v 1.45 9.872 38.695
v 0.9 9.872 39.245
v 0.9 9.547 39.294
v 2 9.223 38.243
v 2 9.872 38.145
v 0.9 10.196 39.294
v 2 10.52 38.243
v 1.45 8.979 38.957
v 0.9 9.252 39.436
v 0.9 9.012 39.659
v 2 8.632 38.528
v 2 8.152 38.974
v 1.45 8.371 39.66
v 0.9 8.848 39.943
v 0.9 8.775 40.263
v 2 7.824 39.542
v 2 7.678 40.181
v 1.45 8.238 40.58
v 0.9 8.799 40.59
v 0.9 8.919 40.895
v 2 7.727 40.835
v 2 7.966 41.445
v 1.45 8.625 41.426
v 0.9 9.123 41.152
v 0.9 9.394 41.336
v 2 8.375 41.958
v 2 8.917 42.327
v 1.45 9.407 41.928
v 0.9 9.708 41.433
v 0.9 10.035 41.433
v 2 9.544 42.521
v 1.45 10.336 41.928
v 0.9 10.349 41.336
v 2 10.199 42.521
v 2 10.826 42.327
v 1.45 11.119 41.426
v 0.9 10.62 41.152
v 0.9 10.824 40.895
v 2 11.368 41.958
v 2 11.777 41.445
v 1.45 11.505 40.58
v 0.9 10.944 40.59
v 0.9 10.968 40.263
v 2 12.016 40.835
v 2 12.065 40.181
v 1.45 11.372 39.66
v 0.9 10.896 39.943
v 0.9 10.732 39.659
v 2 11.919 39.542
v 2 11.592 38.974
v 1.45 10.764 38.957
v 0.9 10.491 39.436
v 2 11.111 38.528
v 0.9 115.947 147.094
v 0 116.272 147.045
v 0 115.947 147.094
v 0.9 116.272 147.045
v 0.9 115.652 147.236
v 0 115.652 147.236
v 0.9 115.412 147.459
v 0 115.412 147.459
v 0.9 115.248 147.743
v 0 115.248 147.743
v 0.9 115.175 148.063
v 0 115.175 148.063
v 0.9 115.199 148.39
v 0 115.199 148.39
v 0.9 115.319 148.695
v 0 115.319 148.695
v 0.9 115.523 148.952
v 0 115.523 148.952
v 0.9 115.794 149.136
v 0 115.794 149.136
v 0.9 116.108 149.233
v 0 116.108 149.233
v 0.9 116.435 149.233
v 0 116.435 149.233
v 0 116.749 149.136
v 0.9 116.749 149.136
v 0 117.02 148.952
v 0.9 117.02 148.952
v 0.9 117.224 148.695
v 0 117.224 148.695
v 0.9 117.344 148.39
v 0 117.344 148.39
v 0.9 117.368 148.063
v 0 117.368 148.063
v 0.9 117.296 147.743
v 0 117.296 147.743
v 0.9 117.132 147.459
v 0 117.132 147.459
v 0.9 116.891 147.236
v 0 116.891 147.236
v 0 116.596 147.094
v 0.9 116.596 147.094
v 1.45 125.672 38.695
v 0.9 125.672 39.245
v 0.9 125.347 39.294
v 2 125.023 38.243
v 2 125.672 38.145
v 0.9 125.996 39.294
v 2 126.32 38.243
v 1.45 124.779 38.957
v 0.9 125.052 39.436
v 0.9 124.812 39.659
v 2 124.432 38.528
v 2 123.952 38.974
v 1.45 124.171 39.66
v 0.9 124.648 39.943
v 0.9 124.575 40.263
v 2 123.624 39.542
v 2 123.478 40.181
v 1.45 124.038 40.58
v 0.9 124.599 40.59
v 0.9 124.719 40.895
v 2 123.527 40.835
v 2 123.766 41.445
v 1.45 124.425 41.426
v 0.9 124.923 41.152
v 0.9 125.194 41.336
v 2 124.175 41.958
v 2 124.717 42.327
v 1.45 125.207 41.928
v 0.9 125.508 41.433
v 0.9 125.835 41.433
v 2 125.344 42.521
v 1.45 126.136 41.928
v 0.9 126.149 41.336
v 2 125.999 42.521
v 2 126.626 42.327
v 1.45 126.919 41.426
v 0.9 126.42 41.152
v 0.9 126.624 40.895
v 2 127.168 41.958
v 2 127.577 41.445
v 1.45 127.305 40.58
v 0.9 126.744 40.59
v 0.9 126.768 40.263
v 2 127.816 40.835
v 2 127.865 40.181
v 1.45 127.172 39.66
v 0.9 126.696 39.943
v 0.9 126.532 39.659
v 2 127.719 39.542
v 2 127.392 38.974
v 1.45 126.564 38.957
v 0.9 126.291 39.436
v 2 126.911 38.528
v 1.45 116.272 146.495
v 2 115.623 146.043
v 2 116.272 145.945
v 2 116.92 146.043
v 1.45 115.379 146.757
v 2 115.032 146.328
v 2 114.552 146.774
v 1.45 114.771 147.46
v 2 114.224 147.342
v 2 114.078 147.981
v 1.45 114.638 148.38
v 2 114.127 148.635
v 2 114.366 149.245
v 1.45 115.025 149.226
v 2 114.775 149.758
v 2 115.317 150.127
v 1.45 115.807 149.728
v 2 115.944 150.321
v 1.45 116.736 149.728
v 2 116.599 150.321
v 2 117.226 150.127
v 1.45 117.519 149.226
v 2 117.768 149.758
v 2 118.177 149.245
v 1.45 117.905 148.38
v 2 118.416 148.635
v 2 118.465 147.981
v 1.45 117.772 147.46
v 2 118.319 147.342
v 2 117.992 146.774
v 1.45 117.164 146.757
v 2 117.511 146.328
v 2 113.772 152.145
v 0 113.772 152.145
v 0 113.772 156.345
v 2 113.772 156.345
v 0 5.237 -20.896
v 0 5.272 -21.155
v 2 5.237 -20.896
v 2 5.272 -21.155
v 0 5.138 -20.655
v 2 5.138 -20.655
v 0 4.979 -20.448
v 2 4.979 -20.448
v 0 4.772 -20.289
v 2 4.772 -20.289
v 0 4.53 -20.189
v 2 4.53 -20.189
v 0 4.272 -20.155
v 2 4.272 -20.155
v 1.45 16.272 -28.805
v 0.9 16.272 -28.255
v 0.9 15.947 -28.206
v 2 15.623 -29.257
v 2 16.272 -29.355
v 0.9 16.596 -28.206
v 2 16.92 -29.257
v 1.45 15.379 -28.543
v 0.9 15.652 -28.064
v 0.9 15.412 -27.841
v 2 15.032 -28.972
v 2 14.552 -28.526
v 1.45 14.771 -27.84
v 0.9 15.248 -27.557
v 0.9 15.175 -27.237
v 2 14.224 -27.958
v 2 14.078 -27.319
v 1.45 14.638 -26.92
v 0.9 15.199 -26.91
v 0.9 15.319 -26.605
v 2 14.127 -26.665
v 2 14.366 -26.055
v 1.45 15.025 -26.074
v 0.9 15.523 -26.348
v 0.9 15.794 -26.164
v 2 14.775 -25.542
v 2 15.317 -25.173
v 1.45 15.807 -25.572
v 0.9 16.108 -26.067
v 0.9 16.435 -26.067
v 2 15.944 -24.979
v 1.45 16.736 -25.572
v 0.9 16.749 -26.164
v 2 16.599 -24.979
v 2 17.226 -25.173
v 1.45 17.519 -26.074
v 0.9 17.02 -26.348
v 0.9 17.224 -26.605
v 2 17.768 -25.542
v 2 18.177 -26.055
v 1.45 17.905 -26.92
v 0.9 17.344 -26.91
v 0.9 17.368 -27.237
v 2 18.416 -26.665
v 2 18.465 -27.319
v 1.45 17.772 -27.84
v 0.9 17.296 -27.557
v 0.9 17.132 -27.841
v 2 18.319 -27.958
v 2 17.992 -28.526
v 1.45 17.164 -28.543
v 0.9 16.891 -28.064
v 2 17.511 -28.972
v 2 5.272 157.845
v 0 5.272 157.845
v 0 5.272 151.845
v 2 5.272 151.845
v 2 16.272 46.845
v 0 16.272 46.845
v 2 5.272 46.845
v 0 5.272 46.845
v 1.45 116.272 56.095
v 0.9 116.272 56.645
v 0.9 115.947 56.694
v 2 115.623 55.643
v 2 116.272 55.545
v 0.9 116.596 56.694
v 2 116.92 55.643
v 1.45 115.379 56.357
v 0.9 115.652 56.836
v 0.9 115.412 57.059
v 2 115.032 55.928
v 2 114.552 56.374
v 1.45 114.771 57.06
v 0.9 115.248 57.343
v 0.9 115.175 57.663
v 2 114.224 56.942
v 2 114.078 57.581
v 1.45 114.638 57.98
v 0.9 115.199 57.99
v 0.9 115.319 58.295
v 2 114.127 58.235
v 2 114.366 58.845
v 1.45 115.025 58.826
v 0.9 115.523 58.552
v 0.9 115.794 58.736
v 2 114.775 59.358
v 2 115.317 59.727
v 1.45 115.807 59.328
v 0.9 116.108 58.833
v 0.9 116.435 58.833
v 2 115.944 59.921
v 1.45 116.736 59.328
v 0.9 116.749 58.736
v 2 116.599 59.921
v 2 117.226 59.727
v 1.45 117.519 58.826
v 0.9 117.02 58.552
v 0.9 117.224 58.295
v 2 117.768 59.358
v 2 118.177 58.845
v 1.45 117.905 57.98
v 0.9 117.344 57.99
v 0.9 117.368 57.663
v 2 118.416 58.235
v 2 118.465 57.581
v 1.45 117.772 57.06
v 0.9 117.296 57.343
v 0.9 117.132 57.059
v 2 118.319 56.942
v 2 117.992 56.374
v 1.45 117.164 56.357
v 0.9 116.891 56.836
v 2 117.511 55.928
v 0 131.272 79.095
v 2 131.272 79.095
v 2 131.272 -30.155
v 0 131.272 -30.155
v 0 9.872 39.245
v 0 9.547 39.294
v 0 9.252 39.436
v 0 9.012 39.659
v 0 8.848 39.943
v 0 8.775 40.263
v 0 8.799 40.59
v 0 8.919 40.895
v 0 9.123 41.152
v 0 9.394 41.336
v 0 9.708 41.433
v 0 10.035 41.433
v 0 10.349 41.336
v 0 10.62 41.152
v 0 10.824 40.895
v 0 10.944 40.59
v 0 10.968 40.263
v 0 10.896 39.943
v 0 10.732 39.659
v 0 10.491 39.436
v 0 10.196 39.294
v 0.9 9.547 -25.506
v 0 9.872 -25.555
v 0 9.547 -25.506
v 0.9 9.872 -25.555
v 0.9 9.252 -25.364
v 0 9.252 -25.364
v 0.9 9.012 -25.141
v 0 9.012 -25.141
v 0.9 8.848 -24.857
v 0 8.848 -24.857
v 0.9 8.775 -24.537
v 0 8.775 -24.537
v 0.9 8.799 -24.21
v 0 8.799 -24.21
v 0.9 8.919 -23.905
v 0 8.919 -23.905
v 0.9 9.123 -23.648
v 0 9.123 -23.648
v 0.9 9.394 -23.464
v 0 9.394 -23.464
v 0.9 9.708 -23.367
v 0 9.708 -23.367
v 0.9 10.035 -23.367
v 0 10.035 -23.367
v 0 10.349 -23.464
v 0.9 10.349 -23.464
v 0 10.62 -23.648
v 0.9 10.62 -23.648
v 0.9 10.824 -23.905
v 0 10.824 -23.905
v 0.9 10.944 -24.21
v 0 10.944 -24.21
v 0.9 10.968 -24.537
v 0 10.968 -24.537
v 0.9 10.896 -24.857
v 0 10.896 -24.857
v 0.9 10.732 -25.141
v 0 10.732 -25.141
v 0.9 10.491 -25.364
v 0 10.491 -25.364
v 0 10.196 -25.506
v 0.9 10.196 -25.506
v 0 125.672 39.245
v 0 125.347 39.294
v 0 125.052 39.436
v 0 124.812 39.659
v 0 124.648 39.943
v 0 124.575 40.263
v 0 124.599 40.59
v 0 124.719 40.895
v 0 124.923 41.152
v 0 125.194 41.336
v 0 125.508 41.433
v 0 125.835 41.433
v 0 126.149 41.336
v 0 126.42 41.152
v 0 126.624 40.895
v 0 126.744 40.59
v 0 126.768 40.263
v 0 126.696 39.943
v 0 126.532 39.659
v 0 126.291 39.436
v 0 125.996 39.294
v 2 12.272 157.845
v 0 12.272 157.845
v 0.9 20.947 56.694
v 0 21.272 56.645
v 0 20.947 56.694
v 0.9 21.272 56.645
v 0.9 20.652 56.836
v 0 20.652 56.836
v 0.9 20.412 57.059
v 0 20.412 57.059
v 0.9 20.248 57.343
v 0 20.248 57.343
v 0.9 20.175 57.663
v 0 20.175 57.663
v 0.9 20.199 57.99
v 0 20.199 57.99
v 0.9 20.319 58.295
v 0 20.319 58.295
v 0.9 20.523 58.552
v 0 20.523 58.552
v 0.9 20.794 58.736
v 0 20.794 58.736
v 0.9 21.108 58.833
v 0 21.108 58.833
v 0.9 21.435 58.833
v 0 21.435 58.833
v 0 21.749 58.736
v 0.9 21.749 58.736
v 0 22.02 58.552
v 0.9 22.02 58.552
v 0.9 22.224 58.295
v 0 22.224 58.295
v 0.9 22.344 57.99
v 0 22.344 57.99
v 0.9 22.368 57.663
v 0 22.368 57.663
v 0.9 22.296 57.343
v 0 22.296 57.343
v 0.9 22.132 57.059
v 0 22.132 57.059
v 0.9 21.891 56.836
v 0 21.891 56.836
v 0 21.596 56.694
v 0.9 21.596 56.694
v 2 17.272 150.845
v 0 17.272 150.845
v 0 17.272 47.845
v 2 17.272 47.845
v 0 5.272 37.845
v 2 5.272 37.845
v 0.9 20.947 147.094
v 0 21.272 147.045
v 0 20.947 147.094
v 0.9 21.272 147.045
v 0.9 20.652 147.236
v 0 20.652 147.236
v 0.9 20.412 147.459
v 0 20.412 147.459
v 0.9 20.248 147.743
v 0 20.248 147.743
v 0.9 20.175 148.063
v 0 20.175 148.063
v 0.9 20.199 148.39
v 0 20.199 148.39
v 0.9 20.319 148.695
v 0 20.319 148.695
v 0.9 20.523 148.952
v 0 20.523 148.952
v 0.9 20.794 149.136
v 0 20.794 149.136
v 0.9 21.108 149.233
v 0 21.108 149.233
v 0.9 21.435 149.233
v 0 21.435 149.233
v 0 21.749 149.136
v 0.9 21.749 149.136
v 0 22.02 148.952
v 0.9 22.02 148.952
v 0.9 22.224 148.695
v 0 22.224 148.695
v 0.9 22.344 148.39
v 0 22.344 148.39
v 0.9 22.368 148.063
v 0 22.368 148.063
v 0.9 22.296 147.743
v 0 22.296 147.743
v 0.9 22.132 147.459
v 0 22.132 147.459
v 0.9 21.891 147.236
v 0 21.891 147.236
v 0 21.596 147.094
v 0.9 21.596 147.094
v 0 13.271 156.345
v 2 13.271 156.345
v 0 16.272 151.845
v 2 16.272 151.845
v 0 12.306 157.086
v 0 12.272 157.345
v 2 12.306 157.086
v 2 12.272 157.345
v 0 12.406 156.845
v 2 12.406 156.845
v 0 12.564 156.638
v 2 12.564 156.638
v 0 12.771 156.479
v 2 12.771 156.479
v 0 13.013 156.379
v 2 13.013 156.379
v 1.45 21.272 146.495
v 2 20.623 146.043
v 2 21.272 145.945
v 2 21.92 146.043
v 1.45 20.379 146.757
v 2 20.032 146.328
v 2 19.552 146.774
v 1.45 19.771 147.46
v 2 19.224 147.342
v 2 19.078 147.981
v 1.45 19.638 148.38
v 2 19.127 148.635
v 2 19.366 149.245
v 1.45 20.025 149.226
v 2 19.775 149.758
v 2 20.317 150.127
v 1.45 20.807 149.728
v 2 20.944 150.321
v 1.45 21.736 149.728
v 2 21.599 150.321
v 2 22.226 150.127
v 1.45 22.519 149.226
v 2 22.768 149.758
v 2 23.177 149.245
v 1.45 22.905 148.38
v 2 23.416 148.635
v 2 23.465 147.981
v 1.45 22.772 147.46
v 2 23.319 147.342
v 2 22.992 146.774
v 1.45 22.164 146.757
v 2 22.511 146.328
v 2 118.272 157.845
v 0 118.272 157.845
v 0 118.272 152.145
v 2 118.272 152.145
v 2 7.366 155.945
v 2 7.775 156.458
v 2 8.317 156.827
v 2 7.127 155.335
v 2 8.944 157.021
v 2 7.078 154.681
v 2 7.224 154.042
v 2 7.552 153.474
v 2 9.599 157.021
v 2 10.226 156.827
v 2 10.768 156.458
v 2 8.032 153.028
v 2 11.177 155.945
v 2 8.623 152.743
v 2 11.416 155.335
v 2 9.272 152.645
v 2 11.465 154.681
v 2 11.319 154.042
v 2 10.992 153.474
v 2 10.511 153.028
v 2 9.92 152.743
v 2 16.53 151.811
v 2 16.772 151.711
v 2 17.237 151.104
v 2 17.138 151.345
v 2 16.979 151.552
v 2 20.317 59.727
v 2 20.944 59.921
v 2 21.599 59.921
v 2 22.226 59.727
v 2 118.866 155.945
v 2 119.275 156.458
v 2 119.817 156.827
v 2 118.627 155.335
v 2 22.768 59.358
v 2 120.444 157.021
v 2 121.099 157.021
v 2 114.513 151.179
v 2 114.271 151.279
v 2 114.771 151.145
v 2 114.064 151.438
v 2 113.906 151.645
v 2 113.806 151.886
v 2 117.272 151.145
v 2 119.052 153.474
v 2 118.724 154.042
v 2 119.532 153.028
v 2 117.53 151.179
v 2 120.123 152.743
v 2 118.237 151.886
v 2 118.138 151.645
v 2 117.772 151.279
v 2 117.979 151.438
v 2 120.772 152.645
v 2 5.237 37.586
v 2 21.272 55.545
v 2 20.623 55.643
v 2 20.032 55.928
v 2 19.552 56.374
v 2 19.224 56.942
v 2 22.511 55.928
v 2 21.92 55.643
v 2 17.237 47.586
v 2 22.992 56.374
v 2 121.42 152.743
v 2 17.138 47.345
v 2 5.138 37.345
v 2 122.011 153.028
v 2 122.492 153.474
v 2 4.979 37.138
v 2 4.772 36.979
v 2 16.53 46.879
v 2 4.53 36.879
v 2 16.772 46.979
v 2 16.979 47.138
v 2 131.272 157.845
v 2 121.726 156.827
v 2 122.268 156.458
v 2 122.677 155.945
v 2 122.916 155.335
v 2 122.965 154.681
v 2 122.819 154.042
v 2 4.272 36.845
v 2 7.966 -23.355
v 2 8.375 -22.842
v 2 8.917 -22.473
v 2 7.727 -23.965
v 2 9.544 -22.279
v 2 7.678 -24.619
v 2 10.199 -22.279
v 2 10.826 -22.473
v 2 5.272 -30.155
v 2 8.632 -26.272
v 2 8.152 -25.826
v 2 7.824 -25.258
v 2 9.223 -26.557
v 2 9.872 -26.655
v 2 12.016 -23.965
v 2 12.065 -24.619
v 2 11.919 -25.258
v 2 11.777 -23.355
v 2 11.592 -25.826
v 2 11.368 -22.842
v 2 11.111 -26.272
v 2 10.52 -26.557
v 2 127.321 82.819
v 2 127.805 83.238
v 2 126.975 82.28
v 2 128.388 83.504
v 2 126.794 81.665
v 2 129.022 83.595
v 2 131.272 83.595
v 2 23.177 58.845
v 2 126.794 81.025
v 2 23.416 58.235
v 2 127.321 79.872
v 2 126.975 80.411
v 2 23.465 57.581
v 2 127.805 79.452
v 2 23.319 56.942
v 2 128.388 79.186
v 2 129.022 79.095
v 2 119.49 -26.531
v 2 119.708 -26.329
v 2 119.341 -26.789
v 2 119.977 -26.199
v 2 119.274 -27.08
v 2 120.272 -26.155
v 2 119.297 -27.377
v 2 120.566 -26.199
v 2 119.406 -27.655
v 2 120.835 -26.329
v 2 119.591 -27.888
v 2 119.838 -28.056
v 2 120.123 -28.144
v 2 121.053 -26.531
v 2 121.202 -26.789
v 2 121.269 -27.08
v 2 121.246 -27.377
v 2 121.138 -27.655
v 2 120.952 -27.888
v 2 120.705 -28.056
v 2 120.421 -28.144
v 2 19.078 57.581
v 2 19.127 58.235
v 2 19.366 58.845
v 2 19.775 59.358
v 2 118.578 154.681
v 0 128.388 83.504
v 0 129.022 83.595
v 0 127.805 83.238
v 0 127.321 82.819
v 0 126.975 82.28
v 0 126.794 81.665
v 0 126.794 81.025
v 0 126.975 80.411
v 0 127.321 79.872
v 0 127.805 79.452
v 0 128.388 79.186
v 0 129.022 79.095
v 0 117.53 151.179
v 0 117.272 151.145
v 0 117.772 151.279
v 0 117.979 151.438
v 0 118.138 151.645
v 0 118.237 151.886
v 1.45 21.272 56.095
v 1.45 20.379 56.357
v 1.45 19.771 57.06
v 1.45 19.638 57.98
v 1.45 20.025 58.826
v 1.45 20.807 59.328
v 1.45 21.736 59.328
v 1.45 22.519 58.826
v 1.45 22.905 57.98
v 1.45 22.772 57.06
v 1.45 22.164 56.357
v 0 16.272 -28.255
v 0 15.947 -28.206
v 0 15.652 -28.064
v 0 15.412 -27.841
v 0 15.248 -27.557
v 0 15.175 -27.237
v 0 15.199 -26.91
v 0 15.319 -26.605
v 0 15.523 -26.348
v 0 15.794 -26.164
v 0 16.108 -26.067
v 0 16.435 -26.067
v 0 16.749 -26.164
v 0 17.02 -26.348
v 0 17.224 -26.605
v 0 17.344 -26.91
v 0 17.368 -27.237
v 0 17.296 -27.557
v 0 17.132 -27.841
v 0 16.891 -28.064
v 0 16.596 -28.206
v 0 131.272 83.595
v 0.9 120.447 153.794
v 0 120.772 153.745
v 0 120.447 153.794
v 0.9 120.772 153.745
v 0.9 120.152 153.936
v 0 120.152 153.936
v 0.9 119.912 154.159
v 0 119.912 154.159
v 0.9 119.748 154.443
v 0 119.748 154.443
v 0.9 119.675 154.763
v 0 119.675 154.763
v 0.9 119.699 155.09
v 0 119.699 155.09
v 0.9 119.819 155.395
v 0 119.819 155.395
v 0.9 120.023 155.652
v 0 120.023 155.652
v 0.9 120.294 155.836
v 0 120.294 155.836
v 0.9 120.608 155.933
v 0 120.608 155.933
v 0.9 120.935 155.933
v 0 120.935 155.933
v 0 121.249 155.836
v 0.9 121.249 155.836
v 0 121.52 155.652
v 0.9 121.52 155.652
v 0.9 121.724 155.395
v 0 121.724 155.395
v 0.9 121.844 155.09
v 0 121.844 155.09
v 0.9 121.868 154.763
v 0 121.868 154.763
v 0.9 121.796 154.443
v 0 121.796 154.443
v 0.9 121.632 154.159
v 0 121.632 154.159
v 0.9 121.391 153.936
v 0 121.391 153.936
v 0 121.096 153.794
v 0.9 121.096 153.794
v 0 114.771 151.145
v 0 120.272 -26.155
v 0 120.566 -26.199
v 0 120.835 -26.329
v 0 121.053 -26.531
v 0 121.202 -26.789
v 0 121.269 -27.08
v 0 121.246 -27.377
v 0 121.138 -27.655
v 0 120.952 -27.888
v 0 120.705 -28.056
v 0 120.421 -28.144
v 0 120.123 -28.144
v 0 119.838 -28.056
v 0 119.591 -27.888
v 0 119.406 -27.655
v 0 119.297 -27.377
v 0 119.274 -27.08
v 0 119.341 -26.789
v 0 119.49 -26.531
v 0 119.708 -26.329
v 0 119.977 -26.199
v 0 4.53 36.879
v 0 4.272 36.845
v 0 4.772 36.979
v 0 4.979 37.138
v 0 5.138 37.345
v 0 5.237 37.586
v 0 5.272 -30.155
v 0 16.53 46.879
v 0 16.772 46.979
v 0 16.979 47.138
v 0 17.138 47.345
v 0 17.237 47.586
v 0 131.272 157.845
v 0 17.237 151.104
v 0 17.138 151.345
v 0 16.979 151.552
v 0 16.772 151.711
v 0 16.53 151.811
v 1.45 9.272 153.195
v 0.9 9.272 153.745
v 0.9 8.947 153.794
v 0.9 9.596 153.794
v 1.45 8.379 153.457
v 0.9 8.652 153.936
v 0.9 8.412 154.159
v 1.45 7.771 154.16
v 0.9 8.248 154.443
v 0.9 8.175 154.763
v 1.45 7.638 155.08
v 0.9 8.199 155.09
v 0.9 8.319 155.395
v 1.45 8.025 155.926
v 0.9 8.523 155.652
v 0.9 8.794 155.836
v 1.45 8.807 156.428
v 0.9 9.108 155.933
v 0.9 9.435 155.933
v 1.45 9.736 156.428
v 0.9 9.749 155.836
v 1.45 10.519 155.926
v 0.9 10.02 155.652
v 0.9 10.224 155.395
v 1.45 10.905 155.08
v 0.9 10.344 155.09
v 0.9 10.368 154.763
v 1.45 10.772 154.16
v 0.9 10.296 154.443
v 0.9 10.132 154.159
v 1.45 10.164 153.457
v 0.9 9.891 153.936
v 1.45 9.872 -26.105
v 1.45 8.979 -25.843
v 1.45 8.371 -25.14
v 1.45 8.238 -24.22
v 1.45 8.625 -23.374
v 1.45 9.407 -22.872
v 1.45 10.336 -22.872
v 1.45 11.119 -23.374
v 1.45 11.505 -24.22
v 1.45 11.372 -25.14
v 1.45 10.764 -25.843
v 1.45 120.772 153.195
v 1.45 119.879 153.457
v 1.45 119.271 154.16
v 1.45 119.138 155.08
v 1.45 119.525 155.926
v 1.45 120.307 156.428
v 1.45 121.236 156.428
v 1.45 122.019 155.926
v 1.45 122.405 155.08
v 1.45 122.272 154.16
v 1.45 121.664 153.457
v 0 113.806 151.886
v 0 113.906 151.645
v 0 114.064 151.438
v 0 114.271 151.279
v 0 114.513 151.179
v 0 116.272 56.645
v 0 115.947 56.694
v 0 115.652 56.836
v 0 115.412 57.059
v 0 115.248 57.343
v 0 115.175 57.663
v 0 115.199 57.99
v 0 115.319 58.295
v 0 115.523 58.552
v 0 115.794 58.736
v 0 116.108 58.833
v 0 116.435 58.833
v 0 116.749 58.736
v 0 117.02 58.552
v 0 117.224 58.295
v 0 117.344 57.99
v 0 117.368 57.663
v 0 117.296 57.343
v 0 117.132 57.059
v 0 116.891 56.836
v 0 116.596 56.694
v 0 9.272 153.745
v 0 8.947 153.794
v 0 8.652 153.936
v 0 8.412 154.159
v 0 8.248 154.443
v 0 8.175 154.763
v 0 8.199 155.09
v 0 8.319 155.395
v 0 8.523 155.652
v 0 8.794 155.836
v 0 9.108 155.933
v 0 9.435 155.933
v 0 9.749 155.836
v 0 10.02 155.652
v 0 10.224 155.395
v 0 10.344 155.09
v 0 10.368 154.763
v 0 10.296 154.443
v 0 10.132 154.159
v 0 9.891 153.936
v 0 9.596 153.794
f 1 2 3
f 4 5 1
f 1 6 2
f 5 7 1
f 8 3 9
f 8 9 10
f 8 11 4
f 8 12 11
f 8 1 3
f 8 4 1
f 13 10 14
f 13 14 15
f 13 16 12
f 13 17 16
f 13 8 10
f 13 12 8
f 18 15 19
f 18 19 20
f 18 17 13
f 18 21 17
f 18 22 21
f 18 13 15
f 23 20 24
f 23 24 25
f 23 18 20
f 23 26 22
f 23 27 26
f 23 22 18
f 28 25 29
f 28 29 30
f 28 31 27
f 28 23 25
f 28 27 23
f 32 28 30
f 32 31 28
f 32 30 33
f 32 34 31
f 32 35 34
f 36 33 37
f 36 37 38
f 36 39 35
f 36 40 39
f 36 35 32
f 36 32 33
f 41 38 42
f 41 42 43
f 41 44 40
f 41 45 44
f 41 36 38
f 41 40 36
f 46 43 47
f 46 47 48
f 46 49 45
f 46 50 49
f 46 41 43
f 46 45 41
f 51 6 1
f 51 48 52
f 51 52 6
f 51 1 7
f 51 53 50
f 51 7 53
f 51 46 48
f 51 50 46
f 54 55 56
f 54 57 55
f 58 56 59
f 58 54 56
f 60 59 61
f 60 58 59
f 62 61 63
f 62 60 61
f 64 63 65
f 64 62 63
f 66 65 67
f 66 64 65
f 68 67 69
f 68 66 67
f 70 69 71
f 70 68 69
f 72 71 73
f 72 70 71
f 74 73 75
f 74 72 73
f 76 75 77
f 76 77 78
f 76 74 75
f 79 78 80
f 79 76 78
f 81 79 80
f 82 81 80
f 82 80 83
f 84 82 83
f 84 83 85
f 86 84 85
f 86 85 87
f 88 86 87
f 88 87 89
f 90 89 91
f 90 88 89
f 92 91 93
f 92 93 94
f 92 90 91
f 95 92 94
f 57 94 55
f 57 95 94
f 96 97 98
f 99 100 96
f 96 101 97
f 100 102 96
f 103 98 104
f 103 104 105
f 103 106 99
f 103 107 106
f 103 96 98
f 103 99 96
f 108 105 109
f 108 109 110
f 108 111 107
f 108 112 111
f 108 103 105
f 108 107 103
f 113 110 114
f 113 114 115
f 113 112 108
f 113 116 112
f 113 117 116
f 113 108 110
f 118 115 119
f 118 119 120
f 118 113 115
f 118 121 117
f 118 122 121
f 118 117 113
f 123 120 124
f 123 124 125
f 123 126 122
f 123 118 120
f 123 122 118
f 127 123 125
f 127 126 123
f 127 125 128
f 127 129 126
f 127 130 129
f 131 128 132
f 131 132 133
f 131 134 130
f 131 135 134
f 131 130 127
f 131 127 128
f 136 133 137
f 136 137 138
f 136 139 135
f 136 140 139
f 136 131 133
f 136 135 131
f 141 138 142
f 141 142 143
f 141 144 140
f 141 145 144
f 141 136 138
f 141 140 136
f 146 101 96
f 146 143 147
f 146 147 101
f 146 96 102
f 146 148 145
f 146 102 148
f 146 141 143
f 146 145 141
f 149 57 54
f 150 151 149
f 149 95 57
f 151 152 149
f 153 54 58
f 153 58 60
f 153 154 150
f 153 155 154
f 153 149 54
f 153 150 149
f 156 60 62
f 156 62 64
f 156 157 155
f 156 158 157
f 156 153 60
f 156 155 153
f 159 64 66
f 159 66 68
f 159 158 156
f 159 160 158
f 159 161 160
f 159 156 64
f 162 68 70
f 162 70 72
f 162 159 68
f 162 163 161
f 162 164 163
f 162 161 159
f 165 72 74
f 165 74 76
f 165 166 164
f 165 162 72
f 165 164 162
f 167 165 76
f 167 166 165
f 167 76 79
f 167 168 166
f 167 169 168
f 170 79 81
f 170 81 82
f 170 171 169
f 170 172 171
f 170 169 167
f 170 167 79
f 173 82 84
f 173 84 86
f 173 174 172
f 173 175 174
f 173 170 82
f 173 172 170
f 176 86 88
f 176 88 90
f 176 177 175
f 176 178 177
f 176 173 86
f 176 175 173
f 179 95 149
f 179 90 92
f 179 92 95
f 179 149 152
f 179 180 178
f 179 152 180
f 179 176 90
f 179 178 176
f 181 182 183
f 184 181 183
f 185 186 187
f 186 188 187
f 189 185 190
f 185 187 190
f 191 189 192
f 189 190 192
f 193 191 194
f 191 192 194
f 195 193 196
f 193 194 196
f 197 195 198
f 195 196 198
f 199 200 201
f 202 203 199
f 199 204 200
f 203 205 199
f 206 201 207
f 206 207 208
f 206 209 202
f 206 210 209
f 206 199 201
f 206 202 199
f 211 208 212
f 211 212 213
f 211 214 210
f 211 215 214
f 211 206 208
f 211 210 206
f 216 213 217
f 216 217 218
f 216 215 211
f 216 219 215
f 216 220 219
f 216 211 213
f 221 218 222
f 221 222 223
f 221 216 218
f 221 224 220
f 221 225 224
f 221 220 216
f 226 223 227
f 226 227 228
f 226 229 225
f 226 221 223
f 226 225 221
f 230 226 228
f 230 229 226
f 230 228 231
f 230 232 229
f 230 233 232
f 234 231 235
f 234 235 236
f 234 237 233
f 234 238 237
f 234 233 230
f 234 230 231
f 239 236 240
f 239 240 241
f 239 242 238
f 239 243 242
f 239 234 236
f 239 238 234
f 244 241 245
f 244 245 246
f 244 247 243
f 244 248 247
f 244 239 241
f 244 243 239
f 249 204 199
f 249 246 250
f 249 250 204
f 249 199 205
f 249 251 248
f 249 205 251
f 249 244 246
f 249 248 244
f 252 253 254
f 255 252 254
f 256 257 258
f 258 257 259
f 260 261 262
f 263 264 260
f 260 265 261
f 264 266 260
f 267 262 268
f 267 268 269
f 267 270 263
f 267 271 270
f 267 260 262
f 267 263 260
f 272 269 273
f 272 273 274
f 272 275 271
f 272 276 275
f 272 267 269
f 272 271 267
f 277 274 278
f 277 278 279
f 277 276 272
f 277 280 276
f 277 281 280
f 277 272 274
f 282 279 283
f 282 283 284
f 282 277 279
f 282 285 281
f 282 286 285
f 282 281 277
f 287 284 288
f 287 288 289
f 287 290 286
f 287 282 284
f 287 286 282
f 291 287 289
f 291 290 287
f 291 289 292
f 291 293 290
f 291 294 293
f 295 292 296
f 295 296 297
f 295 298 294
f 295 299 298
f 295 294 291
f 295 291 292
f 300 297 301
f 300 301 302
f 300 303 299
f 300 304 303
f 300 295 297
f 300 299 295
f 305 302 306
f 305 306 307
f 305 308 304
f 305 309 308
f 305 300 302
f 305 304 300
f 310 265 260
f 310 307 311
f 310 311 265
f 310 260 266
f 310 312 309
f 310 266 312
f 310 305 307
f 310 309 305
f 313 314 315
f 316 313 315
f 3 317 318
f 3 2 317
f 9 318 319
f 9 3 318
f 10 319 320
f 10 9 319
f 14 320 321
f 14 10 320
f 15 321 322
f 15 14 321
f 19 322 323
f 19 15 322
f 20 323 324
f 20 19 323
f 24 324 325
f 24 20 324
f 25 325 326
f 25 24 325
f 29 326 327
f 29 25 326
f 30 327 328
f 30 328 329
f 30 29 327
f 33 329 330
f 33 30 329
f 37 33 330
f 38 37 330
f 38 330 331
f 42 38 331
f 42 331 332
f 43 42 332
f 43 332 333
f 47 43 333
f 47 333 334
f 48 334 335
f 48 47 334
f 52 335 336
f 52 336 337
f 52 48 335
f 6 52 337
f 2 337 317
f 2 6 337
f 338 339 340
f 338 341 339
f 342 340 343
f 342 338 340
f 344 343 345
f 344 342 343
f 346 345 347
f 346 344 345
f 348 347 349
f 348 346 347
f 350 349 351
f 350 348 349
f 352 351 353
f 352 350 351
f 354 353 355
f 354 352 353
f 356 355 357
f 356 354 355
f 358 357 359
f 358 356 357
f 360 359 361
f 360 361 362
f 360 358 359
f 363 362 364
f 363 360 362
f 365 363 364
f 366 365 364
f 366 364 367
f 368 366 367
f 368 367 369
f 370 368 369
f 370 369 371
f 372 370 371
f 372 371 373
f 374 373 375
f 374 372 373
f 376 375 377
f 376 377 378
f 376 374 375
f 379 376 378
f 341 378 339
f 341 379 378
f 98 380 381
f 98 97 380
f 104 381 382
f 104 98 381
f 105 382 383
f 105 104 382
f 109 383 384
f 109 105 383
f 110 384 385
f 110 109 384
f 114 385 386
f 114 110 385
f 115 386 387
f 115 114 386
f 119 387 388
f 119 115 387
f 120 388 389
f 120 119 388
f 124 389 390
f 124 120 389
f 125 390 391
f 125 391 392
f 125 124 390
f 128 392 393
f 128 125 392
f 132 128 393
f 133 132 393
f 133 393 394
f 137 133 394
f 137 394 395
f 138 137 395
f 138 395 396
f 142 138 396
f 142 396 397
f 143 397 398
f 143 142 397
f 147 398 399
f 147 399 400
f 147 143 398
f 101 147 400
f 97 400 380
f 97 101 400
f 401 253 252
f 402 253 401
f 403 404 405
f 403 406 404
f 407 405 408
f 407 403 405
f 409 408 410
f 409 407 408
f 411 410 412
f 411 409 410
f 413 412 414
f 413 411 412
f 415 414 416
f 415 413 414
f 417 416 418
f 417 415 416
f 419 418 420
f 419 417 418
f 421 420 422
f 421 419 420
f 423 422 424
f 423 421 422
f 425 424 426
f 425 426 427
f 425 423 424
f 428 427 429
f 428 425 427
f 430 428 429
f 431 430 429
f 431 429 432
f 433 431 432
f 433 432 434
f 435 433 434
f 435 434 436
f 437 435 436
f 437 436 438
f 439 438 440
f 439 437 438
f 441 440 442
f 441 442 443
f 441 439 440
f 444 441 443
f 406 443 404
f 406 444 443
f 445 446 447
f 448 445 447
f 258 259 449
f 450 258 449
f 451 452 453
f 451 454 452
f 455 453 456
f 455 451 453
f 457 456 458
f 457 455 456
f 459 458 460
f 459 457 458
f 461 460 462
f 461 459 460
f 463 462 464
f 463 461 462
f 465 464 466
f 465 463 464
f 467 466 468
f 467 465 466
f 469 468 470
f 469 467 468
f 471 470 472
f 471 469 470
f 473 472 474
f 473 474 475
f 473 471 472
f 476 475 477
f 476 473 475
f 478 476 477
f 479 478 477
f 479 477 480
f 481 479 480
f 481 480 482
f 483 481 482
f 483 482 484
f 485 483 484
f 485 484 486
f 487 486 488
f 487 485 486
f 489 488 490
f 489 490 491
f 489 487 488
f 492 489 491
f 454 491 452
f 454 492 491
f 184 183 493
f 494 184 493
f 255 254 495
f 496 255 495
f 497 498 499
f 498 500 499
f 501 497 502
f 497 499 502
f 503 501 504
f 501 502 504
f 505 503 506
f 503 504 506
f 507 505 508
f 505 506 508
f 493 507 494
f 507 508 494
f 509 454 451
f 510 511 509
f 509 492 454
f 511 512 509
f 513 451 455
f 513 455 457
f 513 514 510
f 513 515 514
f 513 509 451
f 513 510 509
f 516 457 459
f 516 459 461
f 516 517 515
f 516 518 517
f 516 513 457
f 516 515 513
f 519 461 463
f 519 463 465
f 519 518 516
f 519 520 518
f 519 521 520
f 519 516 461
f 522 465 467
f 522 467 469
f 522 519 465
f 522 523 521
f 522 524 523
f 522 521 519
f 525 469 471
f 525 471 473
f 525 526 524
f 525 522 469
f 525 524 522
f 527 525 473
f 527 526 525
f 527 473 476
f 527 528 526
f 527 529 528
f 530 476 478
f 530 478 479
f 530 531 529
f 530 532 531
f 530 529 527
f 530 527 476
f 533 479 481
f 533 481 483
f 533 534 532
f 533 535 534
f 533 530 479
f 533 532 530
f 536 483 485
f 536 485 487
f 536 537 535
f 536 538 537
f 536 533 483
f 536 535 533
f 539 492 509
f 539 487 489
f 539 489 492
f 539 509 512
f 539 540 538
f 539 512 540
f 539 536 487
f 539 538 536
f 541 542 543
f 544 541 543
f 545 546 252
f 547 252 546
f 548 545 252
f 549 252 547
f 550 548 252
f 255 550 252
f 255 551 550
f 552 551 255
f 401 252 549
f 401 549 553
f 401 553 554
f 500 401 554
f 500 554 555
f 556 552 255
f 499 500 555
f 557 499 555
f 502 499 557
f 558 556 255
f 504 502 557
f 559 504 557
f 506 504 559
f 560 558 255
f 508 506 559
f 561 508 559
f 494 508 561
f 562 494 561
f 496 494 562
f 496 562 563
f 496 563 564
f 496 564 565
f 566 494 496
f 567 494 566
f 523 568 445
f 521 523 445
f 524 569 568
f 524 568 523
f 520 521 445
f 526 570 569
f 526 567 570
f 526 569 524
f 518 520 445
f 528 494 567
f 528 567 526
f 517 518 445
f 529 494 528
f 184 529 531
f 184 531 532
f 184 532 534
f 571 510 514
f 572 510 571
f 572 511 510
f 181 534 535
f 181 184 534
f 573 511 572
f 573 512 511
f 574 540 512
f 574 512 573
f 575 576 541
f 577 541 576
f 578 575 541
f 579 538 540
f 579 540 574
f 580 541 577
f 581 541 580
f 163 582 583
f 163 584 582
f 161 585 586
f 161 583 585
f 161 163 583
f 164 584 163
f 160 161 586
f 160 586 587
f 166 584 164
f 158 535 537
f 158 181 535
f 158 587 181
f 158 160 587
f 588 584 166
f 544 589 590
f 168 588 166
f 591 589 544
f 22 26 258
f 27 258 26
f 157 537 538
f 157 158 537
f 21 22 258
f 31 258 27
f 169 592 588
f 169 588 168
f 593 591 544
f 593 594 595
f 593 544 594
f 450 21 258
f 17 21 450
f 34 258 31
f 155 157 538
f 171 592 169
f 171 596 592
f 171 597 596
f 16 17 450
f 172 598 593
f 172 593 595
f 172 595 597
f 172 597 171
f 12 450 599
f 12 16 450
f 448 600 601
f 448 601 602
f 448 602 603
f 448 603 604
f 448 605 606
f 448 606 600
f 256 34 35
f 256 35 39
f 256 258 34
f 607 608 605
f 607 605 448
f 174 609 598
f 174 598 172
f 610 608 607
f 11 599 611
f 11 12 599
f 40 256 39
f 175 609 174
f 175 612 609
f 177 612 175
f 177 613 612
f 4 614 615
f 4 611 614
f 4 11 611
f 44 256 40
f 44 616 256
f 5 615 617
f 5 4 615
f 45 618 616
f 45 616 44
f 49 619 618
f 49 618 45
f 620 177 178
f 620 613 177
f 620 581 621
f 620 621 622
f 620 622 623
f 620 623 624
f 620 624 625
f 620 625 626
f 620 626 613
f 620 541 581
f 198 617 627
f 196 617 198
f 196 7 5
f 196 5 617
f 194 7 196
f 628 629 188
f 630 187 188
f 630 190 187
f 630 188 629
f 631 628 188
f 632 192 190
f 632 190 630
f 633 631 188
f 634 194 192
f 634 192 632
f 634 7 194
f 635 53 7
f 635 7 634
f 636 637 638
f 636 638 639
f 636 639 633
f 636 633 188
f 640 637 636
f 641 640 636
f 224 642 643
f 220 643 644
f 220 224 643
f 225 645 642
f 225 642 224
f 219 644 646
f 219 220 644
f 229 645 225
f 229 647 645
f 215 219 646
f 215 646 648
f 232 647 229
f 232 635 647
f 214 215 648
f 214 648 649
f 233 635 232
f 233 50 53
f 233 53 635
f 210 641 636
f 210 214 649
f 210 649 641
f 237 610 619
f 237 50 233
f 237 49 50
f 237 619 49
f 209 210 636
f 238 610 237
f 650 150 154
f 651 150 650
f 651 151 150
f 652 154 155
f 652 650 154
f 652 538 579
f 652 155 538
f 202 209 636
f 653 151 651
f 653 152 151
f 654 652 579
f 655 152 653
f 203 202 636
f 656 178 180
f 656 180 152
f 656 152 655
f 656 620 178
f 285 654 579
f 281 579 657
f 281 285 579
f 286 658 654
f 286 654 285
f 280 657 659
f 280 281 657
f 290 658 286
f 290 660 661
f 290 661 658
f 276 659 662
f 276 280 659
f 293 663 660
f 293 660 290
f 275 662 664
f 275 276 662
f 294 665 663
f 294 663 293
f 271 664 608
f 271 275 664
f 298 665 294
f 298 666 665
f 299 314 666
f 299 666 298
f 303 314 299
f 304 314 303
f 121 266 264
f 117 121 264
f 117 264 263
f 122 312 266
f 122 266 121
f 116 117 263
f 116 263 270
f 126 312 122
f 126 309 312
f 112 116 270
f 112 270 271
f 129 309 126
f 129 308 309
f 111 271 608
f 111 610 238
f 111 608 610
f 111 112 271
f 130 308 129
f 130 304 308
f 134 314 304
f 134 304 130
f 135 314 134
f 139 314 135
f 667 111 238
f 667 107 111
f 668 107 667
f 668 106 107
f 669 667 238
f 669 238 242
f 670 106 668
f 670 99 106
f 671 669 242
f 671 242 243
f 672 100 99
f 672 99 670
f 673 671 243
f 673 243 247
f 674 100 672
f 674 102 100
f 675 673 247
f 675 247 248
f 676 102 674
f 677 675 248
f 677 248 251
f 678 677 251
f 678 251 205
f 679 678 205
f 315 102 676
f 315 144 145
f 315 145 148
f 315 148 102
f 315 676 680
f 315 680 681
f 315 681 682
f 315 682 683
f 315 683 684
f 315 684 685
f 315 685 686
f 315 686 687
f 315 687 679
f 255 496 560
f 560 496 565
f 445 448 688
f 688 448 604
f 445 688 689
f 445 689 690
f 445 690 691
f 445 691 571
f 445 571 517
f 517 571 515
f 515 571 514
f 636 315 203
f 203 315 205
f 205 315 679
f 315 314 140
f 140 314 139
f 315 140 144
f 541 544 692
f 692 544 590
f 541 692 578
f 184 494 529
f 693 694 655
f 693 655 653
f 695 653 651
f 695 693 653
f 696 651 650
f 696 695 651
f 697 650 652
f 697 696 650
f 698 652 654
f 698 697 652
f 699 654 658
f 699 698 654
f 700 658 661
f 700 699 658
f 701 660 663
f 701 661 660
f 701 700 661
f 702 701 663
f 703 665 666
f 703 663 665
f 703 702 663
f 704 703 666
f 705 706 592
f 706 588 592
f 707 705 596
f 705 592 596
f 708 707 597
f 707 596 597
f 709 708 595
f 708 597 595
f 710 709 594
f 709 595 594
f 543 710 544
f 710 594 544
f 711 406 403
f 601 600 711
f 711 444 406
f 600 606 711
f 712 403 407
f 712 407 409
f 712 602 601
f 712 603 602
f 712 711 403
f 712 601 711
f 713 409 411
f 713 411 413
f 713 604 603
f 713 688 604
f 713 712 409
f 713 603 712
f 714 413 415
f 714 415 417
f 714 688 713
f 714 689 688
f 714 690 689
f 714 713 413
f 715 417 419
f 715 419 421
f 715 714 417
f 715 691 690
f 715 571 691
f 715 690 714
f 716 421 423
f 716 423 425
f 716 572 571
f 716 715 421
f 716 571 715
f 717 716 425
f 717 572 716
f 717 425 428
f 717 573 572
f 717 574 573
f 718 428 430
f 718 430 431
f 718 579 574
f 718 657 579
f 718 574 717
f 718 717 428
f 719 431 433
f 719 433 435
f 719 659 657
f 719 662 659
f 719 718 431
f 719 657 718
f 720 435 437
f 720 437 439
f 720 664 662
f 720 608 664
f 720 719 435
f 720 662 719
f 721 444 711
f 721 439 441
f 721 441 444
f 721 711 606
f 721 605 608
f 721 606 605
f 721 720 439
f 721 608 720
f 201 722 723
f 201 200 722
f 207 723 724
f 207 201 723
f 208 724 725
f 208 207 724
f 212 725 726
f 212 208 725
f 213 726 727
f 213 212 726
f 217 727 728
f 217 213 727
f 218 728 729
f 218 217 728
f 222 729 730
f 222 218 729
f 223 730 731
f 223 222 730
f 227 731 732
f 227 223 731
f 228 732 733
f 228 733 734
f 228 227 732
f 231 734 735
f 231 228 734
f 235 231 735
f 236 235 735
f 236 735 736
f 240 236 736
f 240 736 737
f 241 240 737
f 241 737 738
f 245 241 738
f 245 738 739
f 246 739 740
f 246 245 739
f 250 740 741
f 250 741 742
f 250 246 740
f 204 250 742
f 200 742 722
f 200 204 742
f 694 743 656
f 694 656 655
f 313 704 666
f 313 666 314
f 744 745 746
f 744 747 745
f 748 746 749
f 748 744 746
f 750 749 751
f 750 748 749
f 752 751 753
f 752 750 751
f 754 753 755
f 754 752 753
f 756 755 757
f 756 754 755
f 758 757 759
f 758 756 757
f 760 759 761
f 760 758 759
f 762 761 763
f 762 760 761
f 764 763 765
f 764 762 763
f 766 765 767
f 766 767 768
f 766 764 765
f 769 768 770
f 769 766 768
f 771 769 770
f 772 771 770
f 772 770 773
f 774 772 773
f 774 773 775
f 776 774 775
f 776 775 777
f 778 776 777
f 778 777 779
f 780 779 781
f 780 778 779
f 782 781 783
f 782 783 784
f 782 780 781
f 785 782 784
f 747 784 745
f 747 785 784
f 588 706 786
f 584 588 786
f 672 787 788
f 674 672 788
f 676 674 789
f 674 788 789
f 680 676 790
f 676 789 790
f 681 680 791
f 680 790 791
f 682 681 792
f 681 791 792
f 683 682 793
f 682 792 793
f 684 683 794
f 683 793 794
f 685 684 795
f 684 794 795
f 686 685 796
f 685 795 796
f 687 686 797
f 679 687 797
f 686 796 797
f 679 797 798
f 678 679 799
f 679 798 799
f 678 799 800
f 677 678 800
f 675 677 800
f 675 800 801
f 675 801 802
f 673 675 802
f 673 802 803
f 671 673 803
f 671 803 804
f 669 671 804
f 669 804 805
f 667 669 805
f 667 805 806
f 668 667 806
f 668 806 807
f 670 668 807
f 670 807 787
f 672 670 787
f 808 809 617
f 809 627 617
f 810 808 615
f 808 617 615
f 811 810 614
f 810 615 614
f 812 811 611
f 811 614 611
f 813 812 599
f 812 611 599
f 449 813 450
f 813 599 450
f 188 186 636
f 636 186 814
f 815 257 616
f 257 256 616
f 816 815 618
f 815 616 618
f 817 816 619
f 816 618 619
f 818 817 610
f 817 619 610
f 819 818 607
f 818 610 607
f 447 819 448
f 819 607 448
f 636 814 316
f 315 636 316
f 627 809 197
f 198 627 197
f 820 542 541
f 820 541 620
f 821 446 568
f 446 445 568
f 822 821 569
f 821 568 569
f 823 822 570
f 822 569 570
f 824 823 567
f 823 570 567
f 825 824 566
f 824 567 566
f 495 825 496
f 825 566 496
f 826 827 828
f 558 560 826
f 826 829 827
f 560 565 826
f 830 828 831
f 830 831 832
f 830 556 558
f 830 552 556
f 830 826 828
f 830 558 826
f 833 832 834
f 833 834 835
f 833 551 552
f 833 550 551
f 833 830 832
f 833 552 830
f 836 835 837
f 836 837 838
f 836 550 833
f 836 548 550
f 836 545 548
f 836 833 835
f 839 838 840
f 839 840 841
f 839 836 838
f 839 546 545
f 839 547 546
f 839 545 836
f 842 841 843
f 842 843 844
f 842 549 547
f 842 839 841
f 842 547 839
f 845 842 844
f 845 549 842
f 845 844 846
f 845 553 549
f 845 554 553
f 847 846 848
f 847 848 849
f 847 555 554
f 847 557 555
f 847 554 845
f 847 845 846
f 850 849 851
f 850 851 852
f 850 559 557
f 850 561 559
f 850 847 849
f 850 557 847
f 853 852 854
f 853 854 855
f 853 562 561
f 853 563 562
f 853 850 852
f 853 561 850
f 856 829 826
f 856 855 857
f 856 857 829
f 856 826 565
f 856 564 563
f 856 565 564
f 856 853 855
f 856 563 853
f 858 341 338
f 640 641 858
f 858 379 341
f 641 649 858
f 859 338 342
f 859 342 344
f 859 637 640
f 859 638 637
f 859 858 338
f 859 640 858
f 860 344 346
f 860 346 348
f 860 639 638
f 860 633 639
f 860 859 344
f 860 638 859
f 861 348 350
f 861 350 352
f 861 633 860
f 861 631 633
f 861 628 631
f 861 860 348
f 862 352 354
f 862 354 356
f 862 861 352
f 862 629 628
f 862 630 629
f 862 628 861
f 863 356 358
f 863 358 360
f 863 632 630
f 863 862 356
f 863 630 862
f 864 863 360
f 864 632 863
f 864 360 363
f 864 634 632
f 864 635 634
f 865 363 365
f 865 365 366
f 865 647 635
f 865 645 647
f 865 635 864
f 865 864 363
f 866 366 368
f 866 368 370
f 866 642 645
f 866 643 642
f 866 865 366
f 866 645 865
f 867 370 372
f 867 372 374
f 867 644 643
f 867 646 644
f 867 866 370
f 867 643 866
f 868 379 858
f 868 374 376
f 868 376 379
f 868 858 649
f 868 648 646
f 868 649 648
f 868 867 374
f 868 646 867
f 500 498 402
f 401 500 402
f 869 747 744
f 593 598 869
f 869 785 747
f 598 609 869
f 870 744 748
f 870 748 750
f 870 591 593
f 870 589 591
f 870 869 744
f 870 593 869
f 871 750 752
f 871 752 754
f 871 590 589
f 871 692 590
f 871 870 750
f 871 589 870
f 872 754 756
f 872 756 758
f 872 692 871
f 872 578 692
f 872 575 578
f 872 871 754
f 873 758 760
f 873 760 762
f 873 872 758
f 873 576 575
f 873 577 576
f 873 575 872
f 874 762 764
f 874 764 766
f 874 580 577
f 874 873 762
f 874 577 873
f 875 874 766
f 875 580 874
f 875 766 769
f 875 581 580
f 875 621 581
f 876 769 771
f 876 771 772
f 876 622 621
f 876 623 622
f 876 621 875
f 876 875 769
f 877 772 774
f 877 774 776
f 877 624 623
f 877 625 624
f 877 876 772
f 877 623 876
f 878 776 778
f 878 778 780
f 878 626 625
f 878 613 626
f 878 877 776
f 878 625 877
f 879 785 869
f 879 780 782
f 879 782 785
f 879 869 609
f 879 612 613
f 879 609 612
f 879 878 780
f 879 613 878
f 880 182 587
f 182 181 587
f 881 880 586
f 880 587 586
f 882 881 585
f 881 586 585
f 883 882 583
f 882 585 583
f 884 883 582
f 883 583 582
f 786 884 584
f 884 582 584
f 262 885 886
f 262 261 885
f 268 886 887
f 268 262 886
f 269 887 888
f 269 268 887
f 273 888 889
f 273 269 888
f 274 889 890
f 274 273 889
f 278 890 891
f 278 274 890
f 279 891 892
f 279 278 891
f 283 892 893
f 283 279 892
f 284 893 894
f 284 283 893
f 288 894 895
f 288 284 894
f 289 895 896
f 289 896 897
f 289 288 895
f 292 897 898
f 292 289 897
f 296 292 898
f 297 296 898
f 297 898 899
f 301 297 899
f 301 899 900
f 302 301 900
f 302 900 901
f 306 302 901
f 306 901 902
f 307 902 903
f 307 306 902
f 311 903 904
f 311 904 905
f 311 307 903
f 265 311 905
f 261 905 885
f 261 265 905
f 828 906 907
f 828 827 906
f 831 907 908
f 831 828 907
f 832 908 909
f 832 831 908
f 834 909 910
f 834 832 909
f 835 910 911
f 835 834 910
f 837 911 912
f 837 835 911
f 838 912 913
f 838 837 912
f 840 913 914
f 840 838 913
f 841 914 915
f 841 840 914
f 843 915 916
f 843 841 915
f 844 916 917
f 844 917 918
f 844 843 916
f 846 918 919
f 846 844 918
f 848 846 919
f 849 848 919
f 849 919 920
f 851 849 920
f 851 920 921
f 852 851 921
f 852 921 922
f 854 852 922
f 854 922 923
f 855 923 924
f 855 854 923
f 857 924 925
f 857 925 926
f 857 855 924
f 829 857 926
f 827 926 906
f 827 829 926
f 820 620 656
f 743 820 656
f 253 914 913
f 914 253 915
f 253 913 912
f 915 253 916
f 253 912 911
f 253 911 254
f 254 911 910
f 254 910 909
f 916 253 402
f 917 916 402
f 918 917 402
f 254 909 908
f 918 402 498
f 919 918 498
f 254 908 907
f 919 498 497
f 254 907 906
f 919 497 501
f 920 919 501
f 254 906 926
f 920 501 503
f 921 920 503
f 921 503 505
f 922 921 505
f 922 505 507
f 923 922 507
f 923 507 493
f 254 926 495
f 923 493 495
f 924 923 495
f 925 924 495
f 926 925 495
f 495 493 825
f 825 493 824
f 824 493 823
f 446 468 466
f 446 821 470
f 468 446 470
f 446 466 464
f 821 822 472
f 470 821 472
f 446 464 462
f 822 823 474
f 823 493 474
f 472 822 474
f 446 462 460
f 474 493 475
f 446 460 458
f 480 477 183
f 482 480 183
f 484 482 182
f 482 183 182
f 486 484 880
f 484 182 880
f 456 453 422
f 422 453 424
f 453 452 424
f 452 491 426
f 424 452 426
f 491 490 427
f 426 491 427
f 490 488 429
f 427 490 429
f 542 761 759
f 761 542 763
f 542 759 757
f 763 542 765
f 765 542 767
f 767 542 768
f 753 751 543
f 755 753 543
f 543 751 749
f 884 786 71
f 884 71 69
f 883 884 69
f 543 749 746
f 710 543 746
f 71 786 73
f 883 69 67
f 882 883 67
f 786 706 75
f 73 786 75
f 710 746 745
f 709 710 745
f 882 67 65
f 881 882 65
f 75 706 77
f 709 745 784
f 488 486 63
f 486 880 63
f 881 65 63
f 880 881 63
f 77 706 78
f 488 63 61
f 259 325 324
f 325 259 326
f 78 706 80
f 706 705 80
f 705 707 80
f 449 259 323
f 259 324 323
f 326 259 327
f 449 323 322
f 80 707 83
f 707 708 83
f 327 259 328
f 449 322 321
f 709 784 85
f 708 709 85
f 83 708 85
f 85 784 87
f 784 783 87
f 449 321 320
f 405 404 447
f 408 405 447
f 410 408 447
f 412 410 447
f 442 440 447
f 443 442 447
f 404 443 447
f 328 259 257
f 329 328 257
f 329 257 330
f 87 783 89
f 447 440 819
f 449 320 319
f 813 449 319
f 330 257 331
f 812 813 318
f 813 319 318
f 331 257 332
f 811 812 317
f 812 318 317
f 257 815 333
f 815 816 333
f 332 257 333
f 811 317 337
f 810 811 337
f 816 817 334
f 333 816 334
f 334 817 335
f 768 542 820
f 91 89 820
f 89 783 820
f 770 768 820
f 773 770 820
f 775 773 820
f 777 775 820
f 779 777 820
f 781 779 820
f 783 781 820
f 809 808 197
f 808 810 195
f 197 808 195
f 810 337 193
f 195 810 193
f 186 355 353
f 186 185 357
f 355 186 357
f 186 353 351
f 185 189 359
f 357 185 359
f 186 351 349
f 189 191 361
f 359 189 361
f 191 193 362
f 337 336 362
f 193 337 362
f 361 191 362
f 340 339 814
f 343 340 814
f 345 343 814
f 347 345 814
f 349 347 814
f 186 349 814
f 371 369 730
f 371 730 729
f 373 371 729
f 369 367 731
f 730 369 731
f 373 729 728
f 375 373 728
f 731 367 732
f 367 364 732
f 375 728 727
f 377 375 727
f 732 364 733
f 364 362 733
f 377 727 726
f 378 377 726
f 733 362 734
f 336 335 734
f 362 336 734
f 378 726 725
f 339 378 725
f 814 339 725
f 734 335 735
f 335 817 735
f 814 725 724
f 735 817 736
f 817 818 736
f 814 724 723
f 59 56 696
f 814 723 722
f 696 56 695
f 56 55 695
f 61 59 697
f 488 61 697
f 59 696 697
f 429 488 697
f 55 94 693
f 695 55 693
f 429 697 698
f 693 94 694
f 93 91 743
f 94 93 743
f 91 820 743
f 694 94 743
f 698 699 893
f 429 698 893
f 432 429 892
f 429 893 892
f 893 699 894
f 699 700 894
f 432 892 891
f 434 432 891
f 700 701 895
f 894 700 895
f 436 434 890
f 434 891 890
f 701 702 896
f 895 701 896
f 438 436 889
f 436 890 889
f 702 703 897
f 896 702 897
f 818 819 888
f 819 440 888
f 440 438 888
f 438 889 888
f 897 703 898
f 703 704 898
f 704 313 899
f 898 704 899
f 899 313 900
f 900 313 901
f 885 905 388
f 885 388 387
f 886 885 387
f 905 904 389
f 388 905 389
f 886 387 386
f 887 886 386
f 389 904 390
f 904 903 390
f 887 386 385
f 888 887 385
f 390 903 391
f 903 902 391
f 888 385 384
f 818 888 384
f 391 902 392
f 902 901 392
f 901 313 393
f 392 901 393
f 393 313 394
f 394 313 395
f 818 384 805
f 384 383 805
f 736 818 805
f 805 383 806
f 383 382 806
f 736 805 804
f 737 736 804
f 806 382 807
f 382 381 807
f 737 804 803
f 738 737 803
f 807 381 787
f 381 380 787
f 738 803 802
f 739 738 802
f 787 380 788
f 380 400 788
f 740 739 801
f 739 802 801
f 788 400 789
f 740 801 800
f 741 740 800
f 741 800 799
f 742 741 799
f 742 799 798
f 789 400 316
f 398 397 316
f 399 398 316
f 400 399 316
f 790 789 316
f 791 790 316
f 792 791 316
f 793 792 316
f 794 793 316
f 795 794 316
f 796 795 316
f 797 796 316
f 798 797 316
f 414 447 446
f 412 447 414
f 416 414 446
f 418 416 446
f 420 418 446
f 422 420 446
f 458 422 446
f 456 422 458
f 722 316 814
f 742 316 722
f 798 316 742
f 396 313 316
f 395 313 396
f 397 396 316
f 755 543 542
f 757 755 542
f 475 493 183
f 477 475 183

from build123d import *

# Parameters (mm, degrees)
SKETCH_1_W                = 188
SKETCH_1_H                = 150
EXTRUDE_1_DEPTH           = 2
SKETCH_13_W               = 188
SKETCH_13_H               = 12
CUT_EXTRUDE_8_DEPTH       = 11
SKETCH_5_R                = 1
EPP_DEPTH                 = 2
SKETCH_6_R                = 1
CUT_EXTRUDE_4_DEPTH       = 2
B_FAN_DEPTH               = 2
PCI_E_DEPTH               = 2
SKETCH_14_R               = 1
CUT_EXTRUDE_7447_DEPTH    = 5
IO_2_DEPTH                = 10
HOLE_WIZARD_1_AT_2_COUNT  = 2
HOLE_WIZARD_1_AT_2_PITCH  = 115.8
HOLE_WIZARD_1_AT_3_COUNT  = 2
HOLE_WIZARD_1_AT_3_PITCH  = 132.697701563
HOLE_WIZARD_1_AT_4_COUNT  = 2
HOLE_WIZARD_1_AT_4_PITCH  = 105.840068027
HOLE_WIZARD_1_AT_5_COUNT  = 2
HOLE_WIZARD_1_AT_5_PITCH  = 150.067318228
HOLE_WIZARD_1_AT_6_COUNT  = 2
HOLE_WIZARD_1_AT_6_PITCH  = 108.209056922
HOLE_WIZARD_1_AT_7_COUNT  = 2
HOLE_WIZARD_1_AT_7_PITCH  = 19.776754031
HOLE_WIZARD_1_AT_8_COUNT  = 2
HOLE_WIZARD_1_AT_8_PITCH  = 114.604799201
HOLE_WIZARD_1_AT_9_COUNT  = 2
HOLE_WIZARD_1_AT_9_PITCH  = 163.276483304
HOLE_WIZARD_1_AT_10_COUNT = 2
HOLE_WIZARD_1_AT_10_PITCH = 128.548084389
CUT_EXTRUDE_14_DEPTH      = 10
FILLET_2_R                = 1


with BuildPart() as part:
    # 草图1 → 凸台-拉伸1 (new body)
    with BuildSketch(Plane(origin=(0, 0, 0), x_dir=(0, 0, -1), z_dir=(1, 0, 0))):
        with Locations((-63.845257573, 68.271545487)):
            Rectangle(SKETCH_1_W, SKETCH_1_H)
    extrude(amount=EXTRUDE_1_DEPTH)

    # 草图13 → 切除-拉伸8 (cut)
    with BuildSketch(Plane(origin=(2, 0, 0), x_dir=(0, 0, -1), z_dir=(1, 0, 0))):
        with Locations((-63.845257573, 137.271545487)):
            Rectangle(SKETCH_13_W, SKETCH_13_H)
    extrude(amount=-CUT_EXTRUDE_8_DEPTH, mode=Mode.SUBTRACT)

    # 草图5 → EPP (cut)
    with BuildSketch(Plane.ZY):
        with Locations((40.345257573, 125.671545487)):
            Circle(SKETCH_5_R)
        with Locations((-24.454742427, 9.871545487)):
            Circle(SKETCH_5_R)
        with Locations((40.345257573, 9.871545487)):
            Circle(SKETCH_5_R)
    extrude(amount=-EPP_DEPTH, mode=Mode.SUBTRACT)

    # 草图6 → 切除-拉伸4 (cut)
    with BuildSketch(Plane.ZY):
        with Locations((57.745257573, 116.271545487)):
            Circle(SKETCH_6_R)
        with Locations((148.145257573, 116.271545487)):
            Circle(SKETCH_6_R)
        with Locations((57.745257573, 21.271545487)):
            Circle(SKETCH_6_R)
        with Locations((148.145257573, 21.271545487)):
            Circle(SKETCH_6_R)
    extrude(amount=-CUT_EXTRUDE_4_DEPTH, mode=Mode.SUBTRACT)

    # 草图3 → B-FAN (cut)
    with BuildSketch(Plane.ZY):
        Polygon((-30.154742427, -6.728454513), (46.845257573, -6.728454513), (46.845257573, 4.271545487), (46.845257573, 5.271545487), (36.845257573, 5.271545487), (36.845257573, 4.271545487), (-20.154742427, 4.271545487), (-20.154742427, 5.271545487), (-30.154742427, 5.271545487), (-30.154742427, 4.271545487), align=None)
    extrude(amount=-B_FAN_DEPTH, mode=Mode.SUBTRACT)

    # 草图10 → PCI-E (cut)
    with BuildSketch(Plane.ZY):
        Polygon((46.845257573, 5.271545487), (46.845257573, -6.728454513), (157.845257573, -6.728454513), (157.845257573, 5.271545487), (151.845257573, 5.271545487), (151.845257573, 17.271545487), (46.845257573, 17.271545487), align=None)
    extrude(amount=-PCI_E_DEPTH, mode=Mode.SUBTRACT)

    # 草图14 → Cut-Extrude 7447 (cut)
    with BuildSketch(Plane.ZY):
        with Locations((154.845257573, 120.771545487)):
            Circle(SKETCH_14_R)
        with Locations((154.845257573, 9.271545487)):
            Circle(SKETCH_14_R)
        with Locations((-27.154742427, 16.271545487)):
            Circle(SKETCH_14_R)
        with Locations((-27.154742427, 120.271545487)):
            Circle(SKETCH_14_R)
    extrude(amount=-CUT_EXTRUDE_7447_DEPTH, mode=Mode.SUBTRACT)

    # 草图15 → IO 2 (cut)
    with BuildSketch(Plane.ZY):
        Polygon((157.845257573, 118.271545487), (156.345257573, 118.271545487), (151.145257573, 118.271545487), (151.145257573, 113.771545487), (156.345257573, 113.771545487), (156.345257573, 12.271545487), (157.845257573, 12.271545487), align=None)
    extrude(amount=-IO_2_DEPTH, mode=Mode.SUBTRACT)

    # 草图17 → 打孔尺寸(%根据)内六角花形沉头螺钉的类型1 (revolve, cut)
    with BuildSketch(Plane(origin=(2, 125.671545487, 40.345257573), x_dir=(0, 0, -1), z_dir=(0, 1, 0))):
        Polygon((0, 0), (0, 2), (1.1, 2), (1.1, 1.1), (2.2, 0), align=None)
    hole_wizard_1 = revolve(axis=Axis((8.35, 125.671545487, 40.345257573), (-1, 0, 0)), mode=Mode.SUBTRACT)

    # 打孔尺寸(%根据)内六角花形沉头螺钉的类型1 at 2: 打孔尺寸(%根据)内六角花形沉头螺钉的类型1 ×2
    with Locations(*[(0, -i * HOLE_WIZARD_1_AT_2_PITCH, 0) for i in range(1, HOLE_WIZARD_1_AT_2_COUNT)]):
        add(hole_wizard_1, mode=Mode.SUBTRACT)

    # 打孔尺寸(%根据)内六角花形沉头螺钉的类型1 at 3: 打孔尺寸(%根据)内六角花形沉头螺钉的类型1 ×2
    with Locations(*[Vector(0, -0.8726601790111727, -0.4883279758197234) * (i * HOLE_WIZARD_1_AT_3_PITCH) for i in range(1, HOLE_WIZARD_1_AT_3_COUNT)]):
        add(hole_wizard_1, mode=Mode.SUBTRACT)

    # 打孔尺寸(%根据)内六角花形沉头螺钉的类型1 at 4: 打孔尺寸(%根据)内六角花形沉头螺钉的类型1 ×2
    with Locations(*[Vector(0, -0.9863939238321437, 0.16439898730535765) * (i * HOLE_WIZARD_1_AT_4_PITCH) for i in range(1, HOLE_WIZARD_1_AT_4_COUNT)]):
        add(hole_wizard_1, mode=Mode.SUBTRACT)

    # 打孔尺寸(%根据)内六角花形沉头螺钉的类型1 at 5: 打孔尺寸(%根据)内六角花形沉头螺钉的类型1 ×2
    with Locations(*[Vector(0, -0.6956877835433596, 0.7183442822411324) * (i * HOLE_WIZARD_1_AT_5_PITCH) for i in range(1, HOLE_WIZARD_1_AT_5_COUNT)]):
        add(hole_wizard_1, mode=Mode.SUBTRACT)

    # 打孔尺寸(%根据)内六角花形沉头螺钉的类型1 at 6: 打孔尺寸(%根据)内六角花形沉头螺钉的类型1 ×2
    with Locations(*[Vector(0, -0.0868688838749896, 0.9962197533748834) * (i * HOLE_WIZARD_1_AT_6_PITCH) for i in range(1, HOLE_WIZARD_1_AT_6_COUNT)]):
        add(hole_wizard_1, mode=Mode.SUBTRACT)

    # 打孔尺寸(%根据)内六角花形沉头螺钉的类型1 at 7: 打孔尺寸(%根据)内六角花形沉头螺钉的类型1 ×2
    with Locations(*[Vector(0, -0.47530550186838766, 0.8798208226074444) * (i * HOLE_WIZARD_1_AT_7_PITCH) for i in range(1, HOLE_WIZARD_1_AT_7_COUNT)]):
        add(hole_wizard_1, mode=Mode.SUBTRACT)

    # 打孔尺寸(%根据)内六角花形沉头螺钉的类型1 at 8: 打孔尺寸(%根据)内六角花形沉头螺钉的类型1 ×2
    with Locations(*[Vector(0, -0.04275562658931698, 0.9990855600973096) * (i * HOLE_WIZARD_1_AT_8_PITCH) for i in range(1, HOLE_WIZARD_1_AT_8_COUNT)]):
        add(hole_wizard_1, mode=Mode.SUBTRACT)

    # 打孔尺寸(%根据)内六角花形沉头螺钉的类型1 at 9: 打孔尺寸(%根据)内六角花形沉头螺钉的类型1 ×2
    with Locations(*[Vector(0, -0.7129011946168821, 0.7012644912683248) * (i * HOLE_WIZARD_1_AT_9_PITCH) for i in range(1, HOLE_WIZARD_1_AT_9_COUNT)]):
        add(hole_wizard_1, mode=Mode.SUBTRACT)

    # 打孔尺寸(%根据)内六角花形沉头螺钉的类型1 at 10: 打孔尺寸(%根据)内六角花形沉头螺钉的类型1 ×2
    with Locations(*[Vector(0, -0.8510434093223341, -0.5250953393899228) * (i * HOLE_WIZARD_1_AT_10_PITCH) for i in range(1, HOLE_WIZARD_1_AT_10_COUNT)]):
        add(hole_wizard_1, mode=Mode.SUBTRACT)

    # 草图23 → 切除-拉伸14 (cut)
    with BuildSketch(Plane.ZY):
        with BuildLine():
            Line((83.595257573, 133.521545487), (83.595257573, 129.021545487))
            ThreePointArc((83.595257573, 129.021545487), (81.345257573, 126.771545487), (79.095257573, 129.021545487))
            Line((79.095257573, 129.021545487), (79.095257573, 133.521545487))
            ThreePointArc((79.095257573, 133.521545487), (81.345257573, 135.771545487), (83.595257573, 133.521545487))
        make_face()
    extrude(amount=-CUT_EXTRUDE_14_DEPTH, mode=Mode.SUBTRACT)

    # 圆角2
    fillet_2_edges = [part.edges().sort_by_distance(p)[0] for p in [
        (1, 113.771545487, 151.145257573),
        (1, 118.271545487, 151.145257573),
        (1, 12.271545487, 156.345257573),
        (1, 17.271545487, 151.845257573),
        (1, 17.271545487, 46.845257573),
        (1, 5.271545487, 36.845257573),
        (1, 5.271545487, -20.154742427),
    ]]
    fillet(fillet_2_edges, radius=FILLET_2_R - 0.0001)  # a hair under: the kernel refuses the full size


solid = part.part
